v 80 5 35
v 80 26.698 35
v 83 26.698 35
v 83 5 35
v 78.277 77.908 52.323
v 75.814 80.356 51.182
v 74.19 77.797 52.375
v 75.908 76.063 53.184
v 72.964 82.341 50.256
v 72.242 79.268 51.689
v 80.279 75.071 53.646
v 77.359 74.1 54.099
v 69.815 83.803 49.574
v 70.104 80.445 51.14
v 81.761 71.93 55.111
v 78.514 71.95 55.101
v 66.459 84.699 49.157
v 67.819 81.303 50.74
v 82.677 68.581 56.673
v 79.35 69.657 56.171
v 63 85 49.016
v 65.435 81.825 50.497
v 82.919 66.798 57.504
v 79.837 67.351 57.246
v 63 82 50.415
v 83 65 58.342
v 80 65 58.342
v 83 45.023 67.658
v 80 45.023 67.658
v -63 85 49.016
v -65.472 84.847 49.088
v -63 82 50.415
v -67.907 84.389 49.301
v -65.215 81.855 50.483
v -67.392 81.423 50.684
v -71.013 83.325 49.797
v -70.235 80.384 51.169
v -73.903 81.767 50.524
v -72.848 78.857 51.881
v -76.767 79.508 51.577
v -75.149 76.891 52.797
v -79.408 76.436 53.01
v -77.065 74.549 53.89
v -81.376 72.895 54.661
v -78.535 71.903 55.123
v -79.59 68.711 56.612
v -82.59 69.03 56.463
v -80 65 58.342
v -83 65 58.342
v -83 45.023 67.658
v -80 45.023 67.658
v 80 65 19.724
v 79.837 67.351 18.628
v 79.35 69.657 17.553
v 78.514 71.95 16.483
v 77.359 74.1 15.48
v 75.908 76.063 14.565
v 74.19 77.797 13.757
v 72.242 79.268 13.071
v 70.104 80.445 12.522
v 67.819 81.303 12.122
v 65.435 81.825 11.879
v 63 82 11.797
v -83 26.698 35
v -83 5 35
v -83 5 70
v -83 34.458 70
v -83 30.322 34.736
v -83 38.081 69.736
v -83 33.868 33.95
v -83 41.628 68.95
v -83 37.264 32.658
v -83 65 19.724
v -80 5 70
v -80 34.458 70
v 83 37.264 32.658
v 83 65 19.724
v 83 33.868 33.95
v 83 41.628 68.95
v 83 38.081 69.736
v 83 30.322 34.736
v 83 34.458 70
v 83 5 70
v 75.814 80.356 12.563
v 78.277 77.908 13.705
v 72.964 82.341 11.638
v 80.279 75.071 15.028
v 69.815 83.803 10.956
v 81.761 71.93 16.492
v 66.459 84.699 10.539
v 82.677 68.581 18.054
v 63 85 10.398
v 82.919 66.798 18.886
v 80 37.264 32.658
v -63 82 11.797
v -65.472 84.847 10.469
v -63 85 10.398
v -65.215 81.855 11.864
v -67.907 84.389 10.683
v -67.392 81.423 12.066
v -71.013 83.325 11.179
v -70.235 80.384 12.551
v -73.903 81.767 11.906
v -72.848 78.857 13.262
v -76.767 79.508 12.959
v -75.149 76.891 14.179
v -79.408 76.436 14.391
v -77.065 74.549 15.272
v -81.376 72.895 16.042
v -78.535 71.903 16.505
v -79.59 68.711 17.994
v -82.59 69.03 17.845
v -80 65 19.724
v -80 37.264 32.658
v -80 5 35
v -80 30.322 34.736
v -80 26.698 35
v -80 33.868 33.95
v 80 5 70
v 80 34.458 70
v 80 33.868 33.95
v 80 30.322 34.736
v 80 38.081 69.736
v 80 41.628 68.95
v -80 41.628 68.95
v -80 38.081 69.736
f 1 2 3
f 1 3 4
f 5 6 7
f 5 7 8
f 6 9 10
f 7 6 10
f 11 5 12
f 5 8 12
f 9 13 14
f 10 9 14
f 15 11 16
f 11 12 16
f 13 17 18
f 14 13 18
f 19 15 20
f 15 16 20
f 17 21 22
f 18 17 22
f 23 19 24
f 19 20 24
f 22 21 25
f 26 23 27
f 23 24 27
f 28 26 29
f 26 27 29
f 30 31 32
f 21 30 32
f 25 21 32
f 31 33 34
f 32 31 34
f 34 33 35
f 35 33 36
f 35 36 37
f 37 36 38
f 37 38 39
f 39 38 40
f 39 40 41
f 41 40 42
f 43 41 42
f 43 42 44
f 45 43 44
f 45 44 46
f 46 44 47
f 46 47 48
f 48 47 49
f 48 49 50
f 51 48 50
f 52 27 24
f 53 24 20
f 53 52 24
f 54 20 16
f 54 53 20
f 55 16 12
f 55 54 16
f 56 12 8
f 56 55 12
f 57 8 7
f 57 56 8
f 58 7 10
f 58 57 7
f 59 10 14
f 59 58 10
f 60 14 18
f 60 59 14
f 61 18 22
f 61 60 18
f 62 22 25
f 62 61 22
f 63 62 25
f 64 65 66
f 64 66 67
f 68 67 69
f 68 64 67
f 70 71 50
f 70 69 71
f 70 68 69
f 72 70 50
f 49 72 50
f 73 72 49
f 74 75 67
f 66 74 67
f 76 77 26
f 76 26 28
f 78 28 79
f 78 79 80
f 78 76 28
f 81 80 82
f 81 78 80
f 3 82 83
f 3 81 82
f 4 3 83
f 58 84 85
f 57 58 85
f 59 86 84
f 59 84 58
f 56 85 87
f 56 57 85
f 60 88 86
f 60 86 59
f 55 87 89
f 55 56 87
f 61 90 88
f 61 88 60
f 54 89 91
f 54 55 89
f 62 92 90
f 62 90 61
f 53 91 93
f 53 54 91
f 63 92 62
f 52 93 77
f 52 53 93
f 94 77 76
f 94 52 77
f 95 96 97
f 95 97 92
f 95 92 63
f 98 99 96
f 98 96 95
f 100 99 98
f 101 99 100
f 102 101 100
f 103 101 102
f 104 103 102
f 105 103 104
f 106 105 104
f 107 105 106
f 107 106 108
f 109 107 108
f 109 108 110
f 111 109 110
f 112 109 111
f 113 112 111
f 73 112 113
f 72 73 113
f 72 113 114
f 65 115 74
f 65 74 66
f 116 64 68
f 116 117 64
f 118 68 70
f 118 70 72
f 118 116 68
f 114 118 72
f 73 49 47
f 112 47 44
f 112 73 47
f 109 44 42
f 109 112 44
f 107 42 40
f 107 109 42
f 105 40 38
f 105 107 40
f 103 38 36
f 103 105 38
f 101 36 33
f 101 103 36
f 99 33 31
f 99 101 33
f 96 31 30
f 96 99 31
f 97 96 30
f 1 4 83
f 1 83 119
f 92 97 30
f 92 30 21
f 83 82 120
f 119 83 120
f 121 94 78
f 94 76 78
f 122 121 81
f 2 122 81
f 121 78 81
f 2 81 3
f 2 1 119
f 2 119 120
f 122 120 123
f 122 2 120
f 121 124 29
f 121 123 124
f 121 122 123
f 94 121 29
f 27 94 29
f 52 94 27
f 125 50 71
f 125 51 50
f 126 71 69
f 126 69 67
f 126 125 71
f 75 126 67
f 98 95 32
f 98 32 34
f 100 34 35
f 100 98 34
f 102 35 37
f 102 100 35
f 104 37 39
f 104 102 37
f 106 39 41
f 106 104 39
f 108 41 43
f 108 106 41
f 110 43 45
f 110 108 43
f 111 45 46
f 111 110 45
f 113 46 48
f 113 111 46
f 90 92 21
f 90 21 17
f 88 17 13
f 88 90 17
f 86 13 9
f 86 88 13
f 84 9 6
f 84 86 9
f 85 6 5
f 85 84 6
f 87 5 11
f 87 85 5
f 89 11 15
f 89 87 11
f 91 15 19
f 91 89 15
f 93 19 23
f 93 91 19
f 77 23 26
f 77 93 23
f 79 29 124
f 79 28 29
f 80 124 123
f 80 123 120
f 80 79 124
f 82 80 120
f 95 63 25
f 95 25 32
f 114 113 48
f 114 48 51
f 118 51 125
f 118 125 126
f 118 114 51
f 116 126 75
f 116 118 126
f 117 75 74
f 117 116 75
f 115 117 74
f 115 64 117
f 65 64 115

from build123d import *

# Parameters (mm, degrees)
BOSS_EXTRUDE1_DEPTH = 70
CUT_EXTRUDE1_DEPTH  = 200.200903612
FILLET1_R           = 25


with BuildPart() as part:
    # Sketch1 → Boss-Extrude1 (new body)
    with BuildSketch(Plane.XY):
        with BuildLine():
            Line((-83, 5), (-83, 65))
            ThreePointArc((-83, 65), (-77.142135624, 79.142135624), (-63, 85))
            Line((-63, 85), (63, 85))
            ThreePointArc((63, 85), (77.142135624, 79.142135624), (83, 65))
            Line((83, 65), (83, 5))
            Line((83, 5), (80, 5))
            Line((80, 5), (80, 65))
            ThreePointArc((80, 65), (75.02081528, 77.02081528), (63, 82))
            Line((63, 82), (-63, 82))
            ThreePointArc((-63, 82), (-75.02081528, 77.02081528), (-80, 65))
            Line((-80, 65), (-80, 5))
            Line((-80, 5), (-83, 5))
        make_face()
    extrude(amount=BOSS_EXTRUDE1_DEPTH)

    # Sketch2 → Cut-Extrude1 (cut, through all)
    with BuildSketch(Plane.ZY.offset(83)):
        Polygon((49.016155383, 85), (70, 40), (70, 85), align=None)
        Polygon((10.397928219, 85), (35, 32.240686807), (35, 4.870884332), (0, 4.870884332), (0, 85), align=None)
    extrude(amount=-CUT_EXTRUDE1_DEPTH, mode=Mode.SUBTRACT)

    # Fillet1
    fillet1_edges = [part.edges().sort_by_distance(p)[0] for p in [
        (-81.5, 40, 70),
        (81.5, 40, 70),
        (-81.5, 32.240686807, 35),
        (81.5, 32.240686807, 35),
    ]]
    fillet(fillet1_edges, radius=FILLET1_R)


solid = part.part
